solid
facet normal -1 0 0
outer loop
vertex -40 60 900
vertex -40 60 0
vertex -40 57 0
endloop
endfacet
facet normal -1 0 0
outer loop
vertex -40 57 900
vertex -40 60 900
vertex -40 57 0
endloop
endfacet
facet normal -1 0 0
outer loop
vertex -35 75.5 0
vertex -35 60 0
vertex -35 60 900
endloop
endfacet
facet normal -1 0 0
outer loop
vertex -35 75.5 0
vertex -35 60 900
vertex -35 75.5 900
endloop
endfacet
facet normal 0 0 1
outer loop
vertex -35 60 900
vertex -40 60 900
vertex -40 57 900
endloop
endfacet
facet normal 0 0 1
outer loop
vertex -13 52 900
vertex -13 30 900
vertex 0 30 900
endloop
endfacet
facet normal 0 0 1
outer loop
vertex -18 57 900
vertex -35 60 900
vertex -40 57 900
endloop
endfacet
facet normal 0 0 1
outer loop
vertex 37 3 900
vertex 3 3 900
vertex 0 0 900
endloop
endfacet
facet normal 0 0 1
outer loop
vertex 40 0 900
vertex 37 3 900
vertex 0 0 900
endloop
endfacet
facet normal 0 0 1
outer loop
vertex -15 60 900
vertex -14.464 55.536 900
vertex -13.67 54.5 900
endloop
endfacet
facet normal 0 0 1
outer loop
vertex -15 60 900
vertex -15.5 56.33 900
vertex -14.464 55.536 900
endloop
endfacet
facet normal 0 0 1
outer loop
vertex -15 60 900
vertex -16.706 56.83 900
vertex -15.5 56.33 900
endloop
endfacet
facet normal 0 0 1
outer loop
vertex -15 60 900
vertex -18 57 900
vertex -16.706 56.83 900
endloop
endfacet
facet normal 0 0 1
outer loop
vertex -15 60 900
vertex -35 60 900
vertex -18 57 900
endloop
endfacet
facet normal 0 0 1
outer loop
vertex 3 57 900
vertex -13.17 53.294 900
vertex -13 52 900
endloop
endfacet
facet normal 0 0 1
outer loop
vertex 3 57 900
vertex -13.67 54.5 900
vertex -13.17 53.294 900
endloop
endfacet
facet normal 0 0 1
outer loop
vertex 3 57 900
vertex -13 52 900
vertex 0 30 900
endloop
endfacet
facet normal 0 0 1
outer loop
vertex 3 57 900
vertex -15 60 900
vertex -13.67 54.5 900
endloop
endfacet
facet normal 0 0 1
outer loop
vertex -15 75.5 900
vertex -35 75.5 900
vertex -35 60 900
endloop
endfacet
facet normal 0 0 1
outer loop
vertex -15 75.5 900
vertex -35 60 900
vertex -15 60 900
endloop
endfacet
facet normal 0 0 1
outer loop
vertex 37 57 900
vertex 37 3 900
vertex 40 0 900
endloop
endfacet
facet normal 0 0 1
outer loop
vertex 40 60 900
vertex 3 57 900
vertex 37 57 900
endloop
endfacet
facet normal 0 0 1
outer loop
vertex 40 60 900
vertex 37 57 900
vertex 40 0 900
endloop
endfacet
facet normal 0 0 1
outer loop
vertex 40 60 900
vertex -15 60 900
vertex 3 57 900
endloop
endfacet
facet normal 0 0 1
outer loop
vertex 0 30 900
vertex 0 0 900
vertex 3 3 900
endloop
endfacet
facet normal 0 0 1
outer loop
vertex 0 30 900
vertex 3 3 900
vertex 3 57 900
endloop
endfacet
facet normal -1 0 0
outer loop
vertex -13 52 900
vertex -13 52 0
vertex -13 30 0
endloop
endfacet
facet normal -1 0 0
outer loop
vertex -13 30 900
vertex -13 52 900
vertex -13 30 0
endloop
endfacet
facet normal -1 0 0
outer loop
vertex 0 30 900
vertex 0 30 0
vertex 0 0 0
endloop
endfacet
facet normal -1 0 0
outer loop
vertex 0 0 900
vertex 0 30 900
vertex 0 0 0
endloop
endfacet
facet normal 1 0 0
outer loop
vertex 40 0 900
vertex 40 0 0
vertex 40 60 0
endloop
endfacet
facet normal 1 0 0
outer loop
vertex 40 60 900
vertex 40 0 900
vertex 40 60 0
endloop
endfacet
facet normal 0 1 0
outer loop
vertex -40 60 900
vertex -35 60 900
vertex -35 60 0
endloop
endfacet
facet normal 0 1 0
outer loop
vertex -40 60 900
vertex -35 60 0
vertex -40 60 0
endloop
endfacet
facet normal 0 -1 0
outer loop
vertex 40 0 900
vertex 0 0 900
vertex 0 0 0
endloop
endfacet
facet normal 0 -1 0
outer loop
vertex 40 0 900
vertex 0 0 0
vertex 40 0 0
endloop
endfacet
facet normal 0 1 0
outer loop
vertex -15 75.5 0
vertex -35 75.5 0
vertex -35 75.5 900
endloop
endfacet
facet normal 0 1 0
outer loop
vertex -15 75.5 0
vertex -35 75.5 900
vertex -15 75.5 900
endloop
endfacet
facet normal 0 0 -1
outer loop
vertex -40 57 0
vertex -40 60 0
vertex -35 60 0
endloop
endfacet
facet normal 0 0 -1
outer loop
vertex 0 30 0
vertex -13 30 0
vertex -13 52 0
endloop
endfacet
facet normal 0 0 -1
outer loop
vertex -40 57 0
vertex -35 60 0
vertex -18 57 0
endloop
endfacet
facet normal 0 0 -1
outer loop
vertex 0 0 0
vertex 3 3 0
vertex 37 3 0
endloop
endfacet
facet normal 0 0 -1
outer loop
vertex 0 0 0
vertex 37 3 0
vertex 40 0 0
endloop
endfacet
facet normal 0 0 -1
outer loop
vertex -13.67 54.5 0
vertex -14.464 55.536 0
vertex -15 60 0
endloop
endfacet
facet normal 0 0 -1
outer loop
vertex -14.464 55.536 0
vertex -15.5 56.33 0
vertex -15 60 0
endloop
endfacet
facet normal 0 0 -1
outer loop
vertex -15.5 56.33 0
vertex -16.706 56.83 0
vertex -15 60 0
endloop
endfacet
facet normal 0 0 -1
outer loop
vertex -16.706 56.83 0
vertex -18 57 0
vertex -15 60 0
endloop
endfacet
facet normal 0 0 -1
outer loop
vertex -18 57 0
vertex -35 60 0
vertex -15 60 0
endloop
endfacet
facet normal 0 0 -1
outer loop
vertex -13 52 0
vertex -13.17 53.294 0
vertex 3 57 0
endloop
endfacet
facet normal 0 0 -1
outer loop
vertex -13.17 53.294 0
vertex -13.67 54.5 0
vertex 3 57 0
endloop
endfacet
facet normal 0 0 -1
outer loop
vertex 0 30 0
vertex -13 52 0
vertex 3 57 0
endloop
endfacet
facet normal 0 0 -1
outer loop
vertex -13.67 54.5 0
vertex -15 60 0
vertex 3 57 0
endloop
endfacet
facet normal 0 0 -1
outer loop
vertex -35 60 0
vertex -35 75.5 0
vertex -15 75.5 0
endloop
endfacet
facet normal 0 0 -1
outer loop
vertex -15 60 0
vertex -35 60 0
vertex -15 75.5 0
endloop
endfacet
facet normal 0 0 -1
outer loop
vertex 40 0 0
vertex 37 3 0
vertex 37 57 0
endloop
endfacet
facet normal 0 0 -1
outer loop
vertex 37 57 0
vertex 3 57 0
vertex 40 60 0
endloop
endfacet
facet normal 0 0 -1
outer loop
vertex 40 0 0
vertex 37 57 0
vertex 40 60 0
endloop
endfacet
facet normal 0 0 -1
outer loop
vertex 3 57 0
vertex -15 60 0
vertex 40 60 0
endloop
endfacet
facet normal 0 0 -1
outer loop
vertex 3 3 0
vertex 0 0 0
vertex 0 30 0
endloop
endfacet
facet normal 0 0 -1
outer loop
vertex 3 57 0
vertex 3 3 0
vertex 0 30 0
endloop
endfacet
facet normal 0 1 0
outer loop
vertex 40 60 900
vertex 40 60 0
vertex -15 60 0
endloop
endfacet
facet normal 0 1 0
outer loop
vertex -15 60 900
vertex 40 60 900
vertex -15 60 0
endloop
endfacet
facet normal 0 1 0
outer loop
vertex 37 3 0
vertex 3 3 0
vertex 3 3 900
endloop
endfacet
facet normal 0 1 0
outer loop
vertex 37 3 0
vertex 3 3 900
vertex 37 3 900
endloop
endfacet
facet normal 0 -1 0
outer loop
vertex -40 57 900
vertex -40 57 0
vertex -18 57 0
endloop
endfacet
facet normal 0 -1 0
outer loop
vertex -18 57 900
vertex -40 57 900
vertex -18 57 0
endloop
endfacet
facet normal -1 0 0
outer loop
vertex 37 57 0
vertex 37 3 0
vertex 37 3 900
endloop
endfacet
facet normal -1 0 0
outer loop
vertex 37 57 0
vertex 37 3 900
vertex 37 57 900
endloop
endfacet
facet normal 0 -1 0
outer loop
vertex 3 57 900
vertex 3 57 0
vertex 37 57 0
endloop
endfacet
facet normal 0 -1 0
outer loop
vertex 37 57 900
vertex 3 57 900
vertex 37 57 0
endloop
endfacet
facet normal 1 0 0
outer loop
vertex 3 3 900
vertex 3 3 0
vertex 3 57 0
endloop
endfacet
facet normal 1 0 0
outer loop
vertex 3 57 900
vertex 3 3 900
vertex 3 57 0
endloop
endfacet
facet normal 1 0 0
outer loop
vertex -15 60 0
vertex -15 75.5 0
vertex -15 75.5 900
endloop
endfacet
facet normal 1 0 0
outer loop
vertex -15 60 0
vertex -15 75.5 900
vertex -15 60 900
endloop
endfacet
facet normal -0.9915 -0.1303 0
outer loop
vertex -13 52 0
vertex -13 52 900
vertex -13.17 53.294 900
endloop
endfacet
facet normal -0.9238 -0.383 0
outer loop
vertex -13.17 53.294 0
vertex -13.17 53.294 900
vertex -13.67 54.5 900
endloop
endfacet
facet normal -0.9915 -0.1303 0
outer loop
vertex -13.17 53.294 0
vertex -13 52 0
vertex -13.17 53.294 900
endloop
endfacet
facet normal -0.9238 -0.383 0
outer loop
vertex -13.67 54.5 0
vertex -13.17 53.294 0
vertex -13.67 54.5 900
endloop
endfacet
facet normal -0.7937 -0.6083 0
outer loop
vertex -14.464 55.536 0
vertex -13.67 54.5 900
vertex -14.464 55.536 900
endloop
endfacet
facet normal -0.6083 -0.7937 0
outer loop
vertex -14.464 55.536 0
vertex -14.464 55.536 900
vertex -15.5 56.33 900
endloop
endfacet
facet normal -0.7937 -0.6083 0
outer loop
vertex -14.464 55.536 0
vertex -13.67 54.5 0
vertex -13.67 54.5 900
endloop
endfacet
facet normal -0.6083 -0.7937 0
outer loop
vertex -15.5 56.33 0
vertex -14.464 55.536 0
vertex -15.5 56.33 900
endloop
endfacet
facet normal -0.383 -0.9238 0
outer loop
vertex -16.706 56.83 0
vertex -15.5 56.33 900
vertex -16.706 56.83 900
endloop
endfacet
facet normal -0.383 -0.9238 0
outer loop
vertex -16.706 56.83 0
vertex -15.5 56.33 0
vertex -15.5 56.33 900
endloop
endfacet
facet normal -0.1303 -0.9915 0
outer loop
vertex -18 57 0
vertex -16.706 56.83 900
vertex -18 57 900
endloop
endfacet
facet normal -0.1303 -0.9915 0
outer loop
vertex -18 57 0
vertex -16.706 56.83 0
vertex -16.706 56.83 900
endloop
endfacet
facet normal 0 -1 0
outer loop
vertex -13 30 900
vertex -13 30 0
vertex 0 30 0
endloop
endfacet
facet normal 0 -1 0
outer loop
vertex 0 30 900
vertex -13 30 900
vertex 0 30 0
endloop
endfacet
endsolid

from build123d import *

# Parameters (mm, degrees)
SKETCH_W  = 34
SKETCH_H  = 54
PAD_DEPTH = 900


with BuildPart() as part:
    # Sketch → Pad (new body)
    with BuildSketch(Plane.XY):
        with BuildLine():
            Line((0, 0), (40, 0))
            Line((40, 0), (40, 60))
            Line((40, 60), (-15, 60))
            Line((-15, 75.5), (-15, 60))
            Line((-35, 75.5), (-15, 75.5))
            Line((-35, 60), (-35, 75.5))
            Line((-35, 60), (-40, 60))
            Line((-40, 60), (-40, 57))
            Line((-40, 57), (-18, 57))
            ThreePointArc((-13, 52), (-14.464466, 55.535534), (-18, 57))
            Line((-13, 52), (-13, 30))
            Line((-13, 30), (0, 30))
            Line((0, 30), (0, 0))
        make_face()
        with Locations((20, 30)):
            Rectangle(SKETCH_W, SKETCH_H, mode=Mode.SUBTRACT)
    extrude(amount=PAD_DEPTH)


solid = part.part
